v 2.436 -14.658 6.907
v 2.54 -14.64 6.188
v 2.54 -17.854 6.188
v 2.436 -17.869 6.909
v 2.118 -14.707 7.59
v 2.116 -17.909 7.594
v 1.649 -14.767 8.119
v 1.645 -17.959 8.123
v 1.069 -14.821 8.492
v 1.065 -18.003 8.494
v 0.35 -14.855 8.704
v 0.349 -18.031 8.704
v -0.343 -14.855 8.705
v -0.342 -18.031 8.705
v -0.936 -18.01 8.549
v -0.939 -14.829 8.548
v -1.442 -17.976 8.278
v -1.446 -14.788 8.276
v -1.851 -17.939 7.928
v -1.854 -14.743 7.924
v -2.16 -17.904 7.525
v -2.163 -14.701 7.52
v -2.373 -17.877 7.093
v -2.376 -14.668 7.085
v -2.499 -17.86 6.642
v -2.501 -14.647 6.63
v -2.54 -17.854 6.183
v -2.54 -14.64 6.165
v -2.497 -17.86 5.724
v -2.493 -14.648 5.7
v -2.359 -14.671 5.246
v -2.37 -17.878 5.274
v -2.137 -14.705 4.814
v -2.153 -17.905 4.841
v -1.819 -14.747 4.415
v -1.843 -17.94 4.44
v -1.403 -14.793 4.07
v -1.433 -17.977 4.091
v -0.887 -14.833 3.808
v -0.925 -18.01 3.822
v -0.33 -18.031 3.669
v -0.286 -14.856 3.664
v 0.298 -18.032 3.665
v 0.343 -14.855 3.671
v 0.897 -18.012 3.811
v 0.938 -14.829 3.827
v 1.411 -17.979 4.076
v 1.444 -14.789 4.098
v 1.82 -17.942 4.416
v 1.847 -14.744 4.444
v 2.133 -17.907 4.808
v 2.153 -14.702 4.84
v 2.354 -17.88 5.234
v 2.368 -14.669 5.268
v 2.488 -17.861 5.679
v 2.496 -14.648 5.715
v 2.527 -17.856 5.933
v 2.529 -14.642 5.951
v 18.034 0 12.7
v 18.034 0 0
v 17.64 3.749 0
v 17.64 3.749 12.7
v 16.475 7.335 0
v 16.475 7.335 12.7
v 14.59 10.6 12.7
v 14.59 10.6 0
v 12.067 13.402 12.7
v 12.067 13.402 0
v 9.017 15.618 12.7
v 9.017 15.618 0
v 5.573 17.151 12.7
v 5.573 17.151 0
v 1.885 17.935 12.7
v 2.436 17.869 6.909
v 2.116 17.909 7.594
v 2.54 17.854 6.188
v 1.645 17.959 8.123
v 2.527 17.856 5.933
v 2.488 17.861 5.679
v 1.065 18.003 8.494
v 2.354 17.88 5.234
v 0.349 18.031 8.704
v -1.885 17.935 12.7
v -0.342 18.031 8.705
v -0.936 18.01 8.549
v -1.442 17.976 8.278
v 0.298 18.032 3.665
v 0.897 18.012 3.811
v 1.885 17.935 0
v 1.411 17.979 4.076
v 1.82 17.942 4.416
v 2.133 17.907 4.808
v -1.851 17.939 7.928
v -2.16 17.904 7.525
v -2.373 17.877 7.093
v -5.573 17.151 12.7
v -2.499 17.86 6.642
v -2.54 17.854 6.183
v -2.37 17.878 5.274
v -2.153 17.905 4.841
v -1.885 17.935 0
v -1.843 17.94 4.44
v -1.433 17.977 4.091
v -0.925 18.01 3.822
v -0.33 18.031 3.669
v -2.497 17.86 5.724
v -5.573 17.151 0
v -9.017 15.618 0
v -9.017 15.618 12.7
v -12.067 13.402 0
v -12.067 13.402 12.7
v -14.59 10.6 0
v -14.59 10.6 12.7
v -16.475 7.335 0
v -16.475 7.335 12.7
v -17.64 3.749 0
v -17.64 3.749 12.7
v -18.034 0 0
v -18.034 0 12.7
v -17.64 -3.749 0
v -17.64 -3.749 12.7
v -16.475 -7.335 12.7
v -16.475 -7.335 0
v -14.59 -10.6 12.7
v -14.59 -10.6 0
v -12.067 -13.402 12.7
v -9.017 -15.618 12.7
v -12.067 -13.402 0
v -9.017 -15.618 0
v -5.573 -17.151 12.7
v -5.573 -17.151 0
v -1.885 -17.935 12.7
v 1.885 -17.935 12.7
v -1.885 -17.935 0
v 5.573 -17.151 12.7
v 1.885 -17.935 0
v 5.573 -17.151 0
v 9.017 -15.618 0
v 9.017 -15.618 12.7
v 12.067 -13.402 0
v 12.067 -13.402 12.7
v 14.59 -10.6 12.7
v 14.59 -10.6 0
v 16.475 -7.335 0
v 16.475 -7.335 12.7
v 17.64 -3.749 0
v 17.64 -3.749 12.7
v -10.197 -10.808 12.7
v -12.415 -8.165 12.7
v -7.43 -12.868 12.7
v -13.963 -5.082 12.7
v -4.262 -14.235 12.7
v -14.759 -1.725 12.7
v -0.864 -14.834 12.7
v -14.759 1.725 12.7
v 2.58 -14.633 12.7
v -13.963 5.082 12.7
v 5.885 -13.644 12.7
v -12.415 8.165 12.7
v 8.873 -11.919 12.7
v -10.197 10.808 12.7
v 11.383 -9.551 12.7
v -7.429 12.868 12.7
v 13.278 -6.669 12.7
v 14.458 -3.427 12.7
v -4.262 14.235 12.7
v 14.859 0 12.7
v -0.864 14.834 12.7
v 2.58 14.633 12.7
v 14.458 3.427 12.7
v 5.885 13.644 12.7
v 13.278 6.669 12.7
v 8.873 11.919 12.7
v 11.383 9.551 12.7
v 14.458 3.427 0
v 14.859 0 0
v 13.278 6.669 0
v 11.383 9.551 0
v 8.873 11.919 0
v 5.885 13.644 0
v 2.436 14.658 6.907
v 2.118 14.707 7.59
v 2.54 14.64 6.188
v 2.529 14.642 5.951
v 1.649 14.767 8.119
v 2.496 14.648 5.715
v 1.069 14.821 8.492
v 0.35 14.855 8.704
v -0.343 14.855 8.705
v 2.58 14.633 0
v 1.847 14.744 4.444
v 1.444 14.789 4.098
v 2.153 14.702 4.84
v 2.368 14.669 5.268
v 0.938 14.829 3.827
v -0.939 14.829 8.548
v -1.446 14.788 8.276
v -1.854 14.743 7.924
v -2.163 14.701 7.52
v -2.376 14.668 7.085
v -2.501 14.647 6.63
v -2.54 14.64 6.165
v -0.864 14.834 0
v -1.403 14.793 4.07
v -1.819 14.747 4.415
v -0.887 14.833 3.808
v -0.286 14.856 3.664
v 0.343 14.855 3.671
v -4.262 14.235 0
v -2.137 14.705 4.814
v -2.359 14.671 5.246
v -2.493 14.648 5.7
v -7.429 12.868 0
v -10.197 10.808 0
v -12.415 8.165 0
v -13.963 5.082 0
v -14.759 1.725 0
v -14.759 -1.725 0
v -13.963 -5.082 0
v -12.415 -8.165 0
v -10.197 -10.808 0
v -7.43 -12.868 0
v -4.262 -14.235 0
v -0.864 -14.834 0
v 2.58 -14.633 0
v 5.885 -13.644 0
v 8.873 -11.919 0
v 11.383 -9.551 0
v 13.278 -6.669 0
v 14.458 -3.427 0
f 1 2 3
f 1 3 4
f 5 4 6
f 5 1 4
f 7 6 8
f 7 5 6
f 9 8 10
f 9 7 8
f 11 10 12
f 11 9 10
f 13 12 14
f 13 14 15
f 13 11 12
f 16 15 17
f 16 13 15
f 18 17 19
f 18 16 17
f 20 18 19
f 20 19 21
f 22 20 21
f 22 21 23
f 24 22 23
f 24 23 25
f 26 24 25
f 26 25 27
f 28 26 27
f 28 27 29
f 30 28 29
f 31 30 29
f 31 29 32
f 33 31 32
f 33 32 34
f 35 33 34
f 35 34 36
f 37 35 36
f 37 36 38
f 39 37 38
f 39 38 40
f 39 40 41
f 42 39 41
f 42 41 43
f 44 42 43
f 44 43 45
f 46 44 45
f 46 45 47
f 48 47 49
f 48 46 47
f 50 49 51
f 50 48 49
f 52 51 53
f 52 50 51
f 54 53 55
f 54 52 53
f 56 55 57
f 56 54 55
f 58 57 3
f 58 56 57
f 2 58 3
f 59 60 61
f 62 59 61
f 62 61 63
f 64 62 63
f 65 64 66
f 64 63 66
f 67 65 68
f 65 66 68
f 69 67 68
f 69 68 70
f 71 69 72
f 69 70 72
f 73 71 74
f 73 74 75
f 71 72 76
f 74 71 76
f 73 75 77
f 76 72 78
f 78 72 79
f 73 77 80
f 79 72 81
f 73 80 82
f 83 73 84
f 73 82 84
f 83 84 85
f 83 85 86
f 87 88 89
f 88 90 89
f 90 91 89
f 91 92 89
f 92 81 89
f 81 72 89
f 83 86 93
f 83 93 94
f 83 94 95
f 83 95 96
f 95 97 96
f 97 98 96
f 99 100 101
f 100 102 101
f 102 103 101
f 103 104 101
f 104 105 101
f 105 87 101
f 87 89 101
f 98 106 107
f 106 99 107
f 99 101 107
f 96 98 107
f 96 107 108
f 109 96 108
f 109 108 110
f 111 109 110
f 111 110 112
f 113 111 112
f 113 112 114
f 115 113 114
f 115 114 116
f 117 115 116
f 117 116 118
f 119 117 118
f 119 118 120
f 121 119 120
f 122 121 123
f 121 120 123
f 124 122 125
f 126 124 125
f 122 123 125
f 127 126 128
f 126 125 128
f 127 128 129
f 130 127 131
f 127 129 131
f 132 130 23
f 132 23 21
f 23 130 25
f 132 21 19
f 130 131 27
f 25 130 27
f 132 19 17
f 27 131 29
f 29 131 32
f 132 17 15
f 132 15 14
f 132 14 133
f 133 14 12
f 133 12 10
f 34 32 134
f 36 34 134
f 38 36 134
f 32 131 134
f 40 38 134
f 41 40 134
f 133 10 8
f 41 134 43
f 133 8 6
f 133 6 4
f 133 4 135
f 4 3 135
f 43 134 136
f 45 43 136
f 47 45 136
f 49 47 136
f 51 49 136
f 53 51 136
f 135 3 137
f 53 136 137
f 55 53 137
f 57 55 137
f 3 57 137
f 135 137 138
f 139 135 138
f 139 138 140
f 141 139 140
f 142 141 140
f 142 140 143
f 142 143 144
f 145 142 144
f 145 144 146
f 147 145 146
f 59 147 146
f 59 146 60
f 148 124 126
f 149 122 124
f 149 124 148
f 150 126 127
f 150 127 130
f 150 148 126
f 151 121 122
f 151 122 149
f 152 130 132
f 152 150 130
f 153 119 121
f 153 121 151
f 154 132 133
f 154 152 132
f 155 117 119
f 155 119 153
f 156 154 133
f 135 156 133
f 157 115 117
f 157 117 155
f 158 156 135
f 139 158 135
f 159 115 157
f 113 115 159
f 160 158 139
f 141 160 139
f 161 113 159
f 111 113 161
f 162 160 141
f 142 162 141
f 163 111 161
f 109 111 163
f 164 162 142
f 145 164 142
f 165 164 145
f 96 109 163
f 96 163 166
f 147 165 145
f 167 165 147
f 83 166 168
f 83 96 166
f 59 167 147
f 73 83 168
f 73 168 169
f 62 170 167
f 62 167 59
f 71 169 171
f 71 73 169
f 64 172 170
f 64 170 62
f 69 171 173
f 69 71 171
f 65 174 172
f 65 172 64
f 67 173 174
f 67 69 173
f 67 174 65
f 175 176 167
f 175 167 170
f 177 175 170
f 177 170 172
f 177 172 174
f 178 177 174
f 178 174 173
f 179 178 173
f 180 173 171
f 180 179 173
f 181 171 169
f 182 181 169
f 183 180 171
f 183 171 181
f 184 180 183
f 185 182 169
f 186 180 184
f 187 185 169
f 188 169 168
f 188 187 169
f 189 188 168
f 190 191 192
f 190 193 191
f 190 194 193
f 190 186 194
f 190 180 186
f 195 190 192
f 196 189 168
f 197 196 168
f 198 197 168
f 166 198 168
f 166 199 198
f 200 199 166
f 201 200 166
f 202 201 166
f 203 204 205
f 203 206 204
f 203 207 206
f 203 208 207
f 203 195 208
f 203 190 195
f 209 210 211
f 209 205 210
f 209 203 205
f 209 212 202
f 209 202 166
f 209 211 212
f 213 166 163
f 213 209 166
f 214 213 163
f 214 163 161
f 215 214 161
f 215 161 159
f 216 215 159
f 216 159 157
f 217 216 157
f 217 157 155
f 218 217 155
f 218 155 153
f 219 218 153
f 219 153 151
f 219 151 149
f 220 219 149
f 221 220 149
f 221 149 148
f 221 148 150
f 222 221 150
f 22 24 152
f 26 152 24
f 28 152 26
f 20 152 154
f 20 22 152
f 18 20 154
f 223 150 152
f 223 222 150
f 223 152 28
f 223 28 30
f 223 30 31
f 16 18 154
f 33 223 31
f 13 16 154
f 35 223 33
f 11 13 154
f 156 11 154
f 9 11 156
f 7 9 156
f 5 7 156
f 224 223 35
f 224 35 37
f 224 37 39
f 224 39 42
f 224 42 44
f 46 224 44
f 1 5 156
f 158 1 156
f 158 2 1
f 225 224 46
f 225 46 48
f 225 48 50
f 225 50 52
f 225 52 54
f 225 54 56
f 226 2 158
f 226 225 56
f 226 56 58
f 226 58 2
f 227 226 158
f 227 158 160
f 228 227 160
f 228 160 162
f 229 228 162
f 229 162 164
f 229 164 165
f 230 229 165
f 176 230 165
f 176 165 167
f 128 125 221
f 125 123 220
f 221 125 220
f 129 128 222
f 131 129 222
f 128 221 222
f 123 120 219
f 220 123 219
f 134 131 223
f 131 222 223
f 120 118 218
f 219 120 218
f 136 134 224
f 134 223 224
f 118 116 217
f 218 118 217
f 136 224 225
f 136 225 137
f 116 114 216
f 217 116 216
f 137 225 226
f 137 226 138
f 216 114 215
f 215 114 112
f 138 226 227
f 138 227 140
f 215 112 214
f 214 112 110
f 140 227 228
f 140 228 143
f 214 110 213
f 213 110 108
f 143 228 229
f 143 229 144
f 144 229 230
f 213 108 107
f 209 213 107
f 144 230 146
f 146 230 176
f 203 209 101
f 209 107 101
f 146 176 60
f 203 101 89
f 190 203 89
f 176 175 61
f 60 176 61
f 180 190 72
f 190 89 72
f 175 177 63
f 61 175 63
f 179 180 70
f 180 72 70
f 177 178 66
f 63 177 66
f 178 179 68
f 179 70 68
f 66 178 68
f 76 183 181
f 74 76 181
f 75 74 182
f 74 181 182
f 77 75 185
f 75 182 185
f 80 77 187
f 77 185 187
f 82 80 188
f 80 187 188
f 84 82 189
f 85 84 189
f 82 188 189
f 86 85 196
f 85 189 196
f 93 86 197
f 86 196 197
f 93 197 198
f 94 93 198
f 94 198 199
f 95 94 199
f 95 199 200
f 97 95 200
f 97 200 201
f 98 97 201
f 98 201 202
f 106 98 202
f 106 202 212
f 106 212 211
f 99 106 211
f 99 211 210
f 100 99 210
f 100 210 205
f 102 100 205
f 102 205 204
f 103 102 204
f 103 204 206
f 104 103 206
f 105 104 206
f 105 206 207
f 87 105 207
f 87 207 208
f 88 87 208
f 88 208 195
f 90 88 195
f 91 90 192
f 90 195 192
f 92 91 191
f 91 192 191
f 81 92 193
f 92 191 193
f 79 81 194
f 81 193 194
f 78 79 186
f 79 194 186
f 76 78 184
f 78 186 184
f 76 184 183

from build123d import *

# Parameters (mm, degrees)
F0_R     = 18.034
F0_R_2   = 14.859
F1_DEPTH = 12.7
F2_R     = 2.54
F3_DEPTH = 50.8
F4_DEPTH = 50.8


with BuildPart() as f1:
    # F0 (on Top) → F1 (new body)
    with BuildSketch(Plane.XY):
        Circle(F0_R)
        Circle(F0_R_2, mode=Mode.SUBTRACT)
    extrude(amount=F1_DEPTH)

    # F2 (on Front) → F3 (cut)
    with BuildSketch(Plane.XZ):
        with Locations((0, 6.187824)):
            Circle(F2_R)
    extrude(amount=-F3_DEPTH, mode=Mode.SUBTRACT)

    # F2 (on Front) → F4 (cut)
    with BuildSketch(Plane.XZ):
        with Locations((0, 6.187824)):
            Circle(F2_R)
    extrude(amount=F4_DEPTH, mode=Mode.SUBTRACT)


solid = f1.part
